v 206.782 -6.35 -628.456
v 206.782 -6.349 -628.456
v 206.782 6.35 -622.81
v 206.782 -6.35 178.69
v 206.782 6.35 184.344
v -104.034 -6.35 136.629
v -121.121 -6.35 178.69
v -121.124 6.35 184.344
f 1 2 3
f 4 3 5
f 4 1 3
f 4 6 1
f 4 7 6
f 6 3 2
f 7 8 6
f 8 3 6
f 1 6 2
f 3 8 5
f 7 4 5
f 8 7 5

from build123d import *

# Parameters (mm, degrees)
F1_DEPTH = 6.35
F4_DEPTH = 330.201
F6_DEPTH = 877.312735


with BuildPart() as f1:
    # F0 (on Front) → F1 (new body, symmetric)
    with BuildSketch(Plane.XZ):
        Polygon((206.782042, 184.344013), (-123.417958, 184.344013), (206.782042, -628.455987), align=None)
    extrude(amount=F1_DEPTH, both=True)

    # F3 (on face) → F4 (cut, through all)
    with BuildSketch(Plane.YZ.offset(206.782042)):
        Polygon((-6.35, 178.689609), (6.35, 184.344013), (-6.35, 184.344013), align=None)
    extrude(amount=-F4_DEPTH, mode=Mode.SUBTRACT)

    # F5 (on face) → F6 (cut, through all)
    with BuildSketch(Plane(origin=(-81.764245, 0, 201.265834), x_dir=(0.926467, 0, 0.376377), z_dir=(0.376377, 0, -0.926467))):
        Polygon((-44.959792, 6.350266), (-44.959792, -6.476734), (-42.813289, -6.476734), align=None)
    extrude(amount=F6_DEPTH, mode=Mode.SUBTRACT)


solid = f1.part
